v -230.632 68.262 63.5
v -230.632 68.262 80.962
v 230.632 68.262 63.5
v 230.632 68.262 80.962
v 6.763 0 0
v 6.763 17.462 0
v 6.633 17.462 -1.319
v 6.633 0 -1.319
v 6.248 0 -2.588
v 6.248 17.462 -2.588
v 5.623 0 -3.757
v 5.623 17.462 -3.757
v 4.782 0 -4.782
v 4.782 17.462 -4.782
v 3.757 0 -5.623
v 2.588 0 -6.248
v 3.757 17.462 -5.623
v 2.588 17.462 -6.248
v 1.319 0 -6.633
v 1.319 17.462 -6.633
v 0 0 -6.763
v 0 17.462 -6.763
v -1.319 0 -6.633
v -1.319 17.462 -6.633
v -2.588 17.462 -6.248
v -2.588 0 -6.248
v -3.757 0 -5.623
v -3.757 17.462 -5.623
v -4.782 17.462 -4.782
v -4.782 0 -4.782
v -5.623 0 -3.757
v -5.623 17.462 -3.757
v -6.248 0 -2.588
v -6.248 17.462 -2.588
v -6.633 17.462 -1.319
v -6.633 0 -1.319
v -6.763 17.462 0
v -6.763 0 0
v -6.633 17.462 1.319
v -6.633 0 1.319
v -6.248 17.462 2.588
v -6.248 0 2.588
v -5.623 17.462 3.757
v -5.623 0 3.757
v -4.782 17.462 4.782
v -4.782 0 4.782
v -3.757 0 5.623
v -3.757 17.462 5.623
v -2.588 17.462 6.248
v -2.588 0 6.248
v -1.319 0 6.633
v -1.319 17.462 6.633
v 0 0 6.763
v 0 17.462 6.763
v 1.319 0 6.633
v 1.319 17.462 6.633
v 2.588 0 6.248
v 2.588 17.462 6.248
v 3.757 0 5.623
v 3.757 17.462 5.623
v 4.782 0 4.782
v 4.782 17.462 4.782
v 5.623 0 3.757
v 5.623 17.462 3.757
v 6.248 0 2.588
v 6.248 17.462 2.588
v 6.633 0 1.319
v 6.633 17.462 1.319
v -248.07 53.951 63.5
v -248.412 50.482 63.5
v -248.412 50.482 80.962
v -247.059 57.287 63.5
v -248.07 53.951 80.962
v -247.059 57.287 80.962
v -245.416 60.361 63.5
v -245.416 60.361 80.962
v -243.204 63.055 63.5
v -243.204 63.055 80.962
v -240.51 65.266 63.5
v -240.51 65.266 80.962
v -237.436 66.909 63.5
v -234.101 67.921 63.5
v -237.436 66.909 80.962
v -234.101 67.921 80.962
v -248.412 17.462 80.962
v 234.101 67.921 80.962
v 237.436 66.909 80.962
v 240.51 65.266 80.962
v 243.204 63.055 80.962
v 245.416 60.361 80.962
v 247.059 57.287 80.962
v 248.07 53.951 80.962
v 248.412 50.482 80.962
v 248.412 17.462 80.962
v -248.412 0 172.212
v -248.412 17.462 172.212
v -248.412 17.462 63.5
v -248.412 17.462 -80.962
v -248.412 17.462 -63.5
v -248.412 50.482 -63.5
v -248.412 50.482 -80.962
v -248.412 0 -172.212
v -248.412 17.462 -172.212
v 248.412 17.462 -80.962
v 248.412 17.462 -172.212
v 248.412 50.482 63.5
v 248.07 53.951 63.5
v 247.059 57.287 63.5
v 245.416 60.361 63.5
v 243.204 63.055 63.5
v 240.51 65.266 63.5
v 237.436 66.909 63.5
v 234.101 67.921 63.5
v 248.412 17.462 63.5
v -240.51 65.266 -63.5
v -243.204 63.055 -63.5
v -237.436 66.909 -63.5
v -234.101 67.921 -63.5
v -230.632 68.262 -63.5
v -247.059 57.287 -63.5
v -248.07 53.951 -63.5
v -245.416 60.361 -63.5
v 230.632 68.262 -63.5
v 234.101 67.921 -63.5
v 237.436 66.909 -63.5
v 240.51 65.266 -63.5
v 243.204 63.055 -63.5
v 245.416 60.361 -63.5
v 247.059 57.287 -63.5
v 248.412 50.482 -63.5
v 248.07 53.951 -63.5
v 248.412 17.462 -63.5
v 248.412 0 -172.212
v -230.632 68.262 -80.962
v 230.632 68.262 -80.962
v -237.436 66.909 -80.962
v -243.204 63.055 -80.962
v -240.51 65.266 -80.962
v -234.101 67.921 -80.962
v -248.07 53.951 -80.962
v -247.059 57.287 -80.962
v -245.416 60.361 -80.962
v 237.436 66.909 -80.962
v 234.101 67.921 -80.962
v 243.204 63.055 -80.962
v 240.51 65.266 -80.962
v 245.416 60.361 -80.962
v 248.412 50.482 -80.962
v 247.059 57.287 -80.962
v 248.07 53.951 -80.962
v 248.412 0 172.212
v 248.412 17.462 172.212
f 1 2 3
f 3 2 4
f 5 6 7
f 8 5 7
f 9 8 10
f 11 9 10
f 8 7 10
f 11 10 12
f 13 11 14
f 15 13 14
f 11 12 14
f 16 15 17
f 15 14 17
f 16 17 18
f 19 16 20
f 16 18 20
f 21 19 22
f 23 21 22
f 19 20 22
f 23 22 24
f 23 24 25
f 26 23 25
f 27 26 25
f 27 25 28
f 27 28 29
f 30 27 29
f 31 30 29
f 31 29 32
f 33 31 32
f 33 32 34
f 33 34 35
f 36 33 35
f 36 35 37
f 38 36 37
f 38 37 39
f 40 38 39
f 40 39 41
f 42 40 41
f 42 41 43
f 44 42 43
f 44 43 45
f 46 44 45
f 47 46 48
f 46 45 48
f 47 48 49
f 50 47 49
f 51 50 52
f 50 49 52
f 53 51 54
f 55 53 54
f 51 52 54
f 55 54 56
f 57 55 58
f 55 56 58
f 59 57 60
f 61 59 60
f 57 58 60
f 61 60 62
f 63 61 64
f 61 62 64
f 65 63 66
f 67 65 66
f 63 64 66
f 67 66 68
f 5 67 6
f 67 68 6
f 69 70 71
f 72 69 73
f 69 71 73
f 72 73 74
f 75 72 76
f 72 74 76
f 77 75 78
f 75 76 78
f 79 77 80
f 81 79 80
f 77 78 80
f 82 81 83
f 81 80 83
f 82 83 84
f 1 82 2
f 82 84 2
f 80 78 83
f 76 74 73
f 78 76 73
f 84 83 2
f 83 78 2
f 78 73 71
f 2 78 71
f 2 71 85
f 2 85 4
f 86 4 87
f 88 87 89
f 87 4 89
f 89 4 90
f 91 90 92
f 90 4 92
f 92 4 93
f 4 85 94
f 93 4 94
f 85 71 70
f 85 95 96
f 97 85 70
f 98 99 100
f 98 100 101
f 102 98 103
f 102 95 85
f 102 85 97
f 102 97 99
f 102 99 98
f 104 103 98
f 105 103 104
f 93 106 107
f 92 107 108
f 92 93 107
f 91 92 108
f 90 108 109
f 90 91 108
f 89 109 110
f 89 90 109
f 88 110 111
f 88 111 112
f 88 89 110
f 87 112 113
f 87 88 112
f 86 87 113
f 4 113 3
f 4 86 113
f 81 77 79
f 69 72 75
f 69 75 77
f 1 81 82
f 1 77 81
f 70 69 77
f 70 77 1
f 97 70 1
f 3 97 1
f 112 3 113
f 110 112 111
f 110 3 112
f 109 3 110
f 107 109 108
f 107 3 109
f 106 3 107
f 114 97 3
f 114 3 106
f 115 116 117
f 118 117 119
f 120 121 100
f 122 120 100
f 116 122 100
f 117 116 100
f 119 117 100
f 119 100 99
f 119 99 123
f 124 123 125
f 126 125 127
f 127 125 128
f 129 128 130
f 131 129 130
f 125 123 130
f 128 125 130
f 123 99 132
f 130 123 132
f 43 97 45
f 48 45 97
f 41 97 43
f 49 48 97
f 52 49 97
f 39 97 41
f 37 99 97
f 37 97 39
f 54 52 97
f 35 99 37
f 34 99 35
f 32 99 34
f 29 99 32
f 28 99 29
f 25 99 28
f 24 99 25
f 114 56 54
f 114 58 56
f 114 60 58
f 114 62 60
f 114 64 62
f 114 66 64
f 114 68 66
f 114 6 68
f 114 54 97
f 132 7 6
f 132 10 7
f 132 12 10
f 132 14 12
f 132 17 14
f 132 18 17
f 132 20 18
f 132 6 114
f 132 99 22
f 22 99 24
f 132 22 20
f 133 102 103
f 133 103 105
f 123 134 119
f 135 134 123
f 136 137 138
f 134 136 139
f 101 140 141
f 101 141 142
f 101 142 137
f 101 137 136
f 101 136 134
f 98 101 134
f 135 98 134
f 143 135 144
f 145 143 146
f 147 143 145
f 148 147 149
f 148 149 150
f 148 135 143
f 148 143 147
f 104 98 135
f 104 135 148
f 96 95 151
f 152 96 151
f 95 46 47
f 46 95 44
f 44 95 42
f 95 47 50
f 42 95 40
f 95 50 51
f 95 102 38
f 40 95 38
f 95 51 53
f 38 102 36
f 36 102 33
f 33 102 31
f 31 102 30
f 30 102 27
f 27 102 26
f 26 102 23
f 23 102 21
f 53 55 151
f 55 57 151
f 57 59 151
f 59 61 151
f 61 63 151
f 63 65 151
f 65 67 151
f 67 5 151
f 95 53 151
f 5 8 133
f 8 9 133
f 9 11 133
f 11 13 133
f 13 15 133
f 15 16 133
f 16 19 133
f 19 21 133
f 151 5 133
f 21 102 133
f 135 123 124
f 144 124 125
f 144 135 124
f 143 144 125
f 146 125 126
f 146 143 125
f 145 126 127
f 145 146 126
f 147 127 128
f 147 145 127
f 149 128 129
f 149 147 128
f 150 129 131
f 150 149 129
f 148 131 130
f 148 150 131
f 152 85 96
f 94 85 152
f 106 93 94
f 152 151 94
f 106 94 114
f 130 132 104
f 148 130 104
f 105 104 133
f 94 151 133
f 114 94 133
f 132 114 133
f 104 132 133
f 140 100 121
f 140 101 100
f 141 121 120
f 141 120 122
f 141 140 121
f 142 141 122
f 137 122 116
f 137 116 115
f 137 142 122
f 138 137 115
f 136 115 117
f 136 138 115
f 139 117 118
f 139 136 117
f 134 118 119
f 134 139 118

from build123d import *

# Parameters (mm, degrees)
SKETCH1_W           = 496.824
SKETCH1_H           = 344.424
BOSS_EXTRUDE1_DEPTH = 17.4625
CUT_EXTRUDE1_REACH  = 19.462
SKETCH3_R           = 6.76275
SKETCH5_W           = 496.824
SKETCH5_H           = 17.4625
BOSS_EXTRUDE2_DEPTH = 50.8
FILLET2_R           = 17.78


with BuildPart() as part:
    # Sketch1 → Boss-Extrude1 (new body)
    with BuildSketch(Plane(origin=(0, 0, 0), x_dir=(1, 0, 0), z_dir=(0, 1, 0))):
        Rectangle(SKETCH1_W, SKETCH1_H)
    extrude(amount=BOSS_EXTRUDE1_DEPTH)

    # Sketch3 → Cut-Extrude1 (cut, up to next)
    with BuildSketch(Plane(origin=(0, 17.4625, 0), x_dir=(1, 0, 0), z_dir=(0, 1, 0)), mode=Mode.PRIVATE) as cut_extrude1_sk1:
        Circle(SKETCH3_R)
    cut_extrude1_tool1 = extrude(cut_extrude1_sk1.sketch, amount=-CUT_EXTRUDE1_REACH, mode=Mode.PRIVATE) & part.part
    add(cut_extrude1_tool1.solids().sort_by_distance((0, 17.4625, 0))[0], mode=Mode.SUBTRACT)

    # Sketch5 → Boss-Extrude2 (add)
    with BuildSketch(Plane(origin=(0, 17.4625, 0), x_dir=(1, 0, 0), z_dir=(0, 1, 0))):
        with Locations((0, 72.23125)):
            Rectangle(SKETCH5_W, SKETCH5_H)
    boss_extrude2 = extrude(amount=BOSS_EXTRUDE2_DEPTH)

    # Mirror1: Boss-Extrude2 across plane
    add(boss_extrude2.mirror(Plane.XY))

    # Fillet2
    fillet2_edges = [part.edges().sort_by_distance(p)[0] for p in [
        (-248.412, 68.2625, -72.23125),
        (248.412, 68.2625, -72.23125),
        (-248.412, 68.2625, 72.23125),
        (248.412, 68.2625, 72.23125),
    ]]
    fillet(fillet2_edges, radius=FILLET2_R)


solid = part.part
